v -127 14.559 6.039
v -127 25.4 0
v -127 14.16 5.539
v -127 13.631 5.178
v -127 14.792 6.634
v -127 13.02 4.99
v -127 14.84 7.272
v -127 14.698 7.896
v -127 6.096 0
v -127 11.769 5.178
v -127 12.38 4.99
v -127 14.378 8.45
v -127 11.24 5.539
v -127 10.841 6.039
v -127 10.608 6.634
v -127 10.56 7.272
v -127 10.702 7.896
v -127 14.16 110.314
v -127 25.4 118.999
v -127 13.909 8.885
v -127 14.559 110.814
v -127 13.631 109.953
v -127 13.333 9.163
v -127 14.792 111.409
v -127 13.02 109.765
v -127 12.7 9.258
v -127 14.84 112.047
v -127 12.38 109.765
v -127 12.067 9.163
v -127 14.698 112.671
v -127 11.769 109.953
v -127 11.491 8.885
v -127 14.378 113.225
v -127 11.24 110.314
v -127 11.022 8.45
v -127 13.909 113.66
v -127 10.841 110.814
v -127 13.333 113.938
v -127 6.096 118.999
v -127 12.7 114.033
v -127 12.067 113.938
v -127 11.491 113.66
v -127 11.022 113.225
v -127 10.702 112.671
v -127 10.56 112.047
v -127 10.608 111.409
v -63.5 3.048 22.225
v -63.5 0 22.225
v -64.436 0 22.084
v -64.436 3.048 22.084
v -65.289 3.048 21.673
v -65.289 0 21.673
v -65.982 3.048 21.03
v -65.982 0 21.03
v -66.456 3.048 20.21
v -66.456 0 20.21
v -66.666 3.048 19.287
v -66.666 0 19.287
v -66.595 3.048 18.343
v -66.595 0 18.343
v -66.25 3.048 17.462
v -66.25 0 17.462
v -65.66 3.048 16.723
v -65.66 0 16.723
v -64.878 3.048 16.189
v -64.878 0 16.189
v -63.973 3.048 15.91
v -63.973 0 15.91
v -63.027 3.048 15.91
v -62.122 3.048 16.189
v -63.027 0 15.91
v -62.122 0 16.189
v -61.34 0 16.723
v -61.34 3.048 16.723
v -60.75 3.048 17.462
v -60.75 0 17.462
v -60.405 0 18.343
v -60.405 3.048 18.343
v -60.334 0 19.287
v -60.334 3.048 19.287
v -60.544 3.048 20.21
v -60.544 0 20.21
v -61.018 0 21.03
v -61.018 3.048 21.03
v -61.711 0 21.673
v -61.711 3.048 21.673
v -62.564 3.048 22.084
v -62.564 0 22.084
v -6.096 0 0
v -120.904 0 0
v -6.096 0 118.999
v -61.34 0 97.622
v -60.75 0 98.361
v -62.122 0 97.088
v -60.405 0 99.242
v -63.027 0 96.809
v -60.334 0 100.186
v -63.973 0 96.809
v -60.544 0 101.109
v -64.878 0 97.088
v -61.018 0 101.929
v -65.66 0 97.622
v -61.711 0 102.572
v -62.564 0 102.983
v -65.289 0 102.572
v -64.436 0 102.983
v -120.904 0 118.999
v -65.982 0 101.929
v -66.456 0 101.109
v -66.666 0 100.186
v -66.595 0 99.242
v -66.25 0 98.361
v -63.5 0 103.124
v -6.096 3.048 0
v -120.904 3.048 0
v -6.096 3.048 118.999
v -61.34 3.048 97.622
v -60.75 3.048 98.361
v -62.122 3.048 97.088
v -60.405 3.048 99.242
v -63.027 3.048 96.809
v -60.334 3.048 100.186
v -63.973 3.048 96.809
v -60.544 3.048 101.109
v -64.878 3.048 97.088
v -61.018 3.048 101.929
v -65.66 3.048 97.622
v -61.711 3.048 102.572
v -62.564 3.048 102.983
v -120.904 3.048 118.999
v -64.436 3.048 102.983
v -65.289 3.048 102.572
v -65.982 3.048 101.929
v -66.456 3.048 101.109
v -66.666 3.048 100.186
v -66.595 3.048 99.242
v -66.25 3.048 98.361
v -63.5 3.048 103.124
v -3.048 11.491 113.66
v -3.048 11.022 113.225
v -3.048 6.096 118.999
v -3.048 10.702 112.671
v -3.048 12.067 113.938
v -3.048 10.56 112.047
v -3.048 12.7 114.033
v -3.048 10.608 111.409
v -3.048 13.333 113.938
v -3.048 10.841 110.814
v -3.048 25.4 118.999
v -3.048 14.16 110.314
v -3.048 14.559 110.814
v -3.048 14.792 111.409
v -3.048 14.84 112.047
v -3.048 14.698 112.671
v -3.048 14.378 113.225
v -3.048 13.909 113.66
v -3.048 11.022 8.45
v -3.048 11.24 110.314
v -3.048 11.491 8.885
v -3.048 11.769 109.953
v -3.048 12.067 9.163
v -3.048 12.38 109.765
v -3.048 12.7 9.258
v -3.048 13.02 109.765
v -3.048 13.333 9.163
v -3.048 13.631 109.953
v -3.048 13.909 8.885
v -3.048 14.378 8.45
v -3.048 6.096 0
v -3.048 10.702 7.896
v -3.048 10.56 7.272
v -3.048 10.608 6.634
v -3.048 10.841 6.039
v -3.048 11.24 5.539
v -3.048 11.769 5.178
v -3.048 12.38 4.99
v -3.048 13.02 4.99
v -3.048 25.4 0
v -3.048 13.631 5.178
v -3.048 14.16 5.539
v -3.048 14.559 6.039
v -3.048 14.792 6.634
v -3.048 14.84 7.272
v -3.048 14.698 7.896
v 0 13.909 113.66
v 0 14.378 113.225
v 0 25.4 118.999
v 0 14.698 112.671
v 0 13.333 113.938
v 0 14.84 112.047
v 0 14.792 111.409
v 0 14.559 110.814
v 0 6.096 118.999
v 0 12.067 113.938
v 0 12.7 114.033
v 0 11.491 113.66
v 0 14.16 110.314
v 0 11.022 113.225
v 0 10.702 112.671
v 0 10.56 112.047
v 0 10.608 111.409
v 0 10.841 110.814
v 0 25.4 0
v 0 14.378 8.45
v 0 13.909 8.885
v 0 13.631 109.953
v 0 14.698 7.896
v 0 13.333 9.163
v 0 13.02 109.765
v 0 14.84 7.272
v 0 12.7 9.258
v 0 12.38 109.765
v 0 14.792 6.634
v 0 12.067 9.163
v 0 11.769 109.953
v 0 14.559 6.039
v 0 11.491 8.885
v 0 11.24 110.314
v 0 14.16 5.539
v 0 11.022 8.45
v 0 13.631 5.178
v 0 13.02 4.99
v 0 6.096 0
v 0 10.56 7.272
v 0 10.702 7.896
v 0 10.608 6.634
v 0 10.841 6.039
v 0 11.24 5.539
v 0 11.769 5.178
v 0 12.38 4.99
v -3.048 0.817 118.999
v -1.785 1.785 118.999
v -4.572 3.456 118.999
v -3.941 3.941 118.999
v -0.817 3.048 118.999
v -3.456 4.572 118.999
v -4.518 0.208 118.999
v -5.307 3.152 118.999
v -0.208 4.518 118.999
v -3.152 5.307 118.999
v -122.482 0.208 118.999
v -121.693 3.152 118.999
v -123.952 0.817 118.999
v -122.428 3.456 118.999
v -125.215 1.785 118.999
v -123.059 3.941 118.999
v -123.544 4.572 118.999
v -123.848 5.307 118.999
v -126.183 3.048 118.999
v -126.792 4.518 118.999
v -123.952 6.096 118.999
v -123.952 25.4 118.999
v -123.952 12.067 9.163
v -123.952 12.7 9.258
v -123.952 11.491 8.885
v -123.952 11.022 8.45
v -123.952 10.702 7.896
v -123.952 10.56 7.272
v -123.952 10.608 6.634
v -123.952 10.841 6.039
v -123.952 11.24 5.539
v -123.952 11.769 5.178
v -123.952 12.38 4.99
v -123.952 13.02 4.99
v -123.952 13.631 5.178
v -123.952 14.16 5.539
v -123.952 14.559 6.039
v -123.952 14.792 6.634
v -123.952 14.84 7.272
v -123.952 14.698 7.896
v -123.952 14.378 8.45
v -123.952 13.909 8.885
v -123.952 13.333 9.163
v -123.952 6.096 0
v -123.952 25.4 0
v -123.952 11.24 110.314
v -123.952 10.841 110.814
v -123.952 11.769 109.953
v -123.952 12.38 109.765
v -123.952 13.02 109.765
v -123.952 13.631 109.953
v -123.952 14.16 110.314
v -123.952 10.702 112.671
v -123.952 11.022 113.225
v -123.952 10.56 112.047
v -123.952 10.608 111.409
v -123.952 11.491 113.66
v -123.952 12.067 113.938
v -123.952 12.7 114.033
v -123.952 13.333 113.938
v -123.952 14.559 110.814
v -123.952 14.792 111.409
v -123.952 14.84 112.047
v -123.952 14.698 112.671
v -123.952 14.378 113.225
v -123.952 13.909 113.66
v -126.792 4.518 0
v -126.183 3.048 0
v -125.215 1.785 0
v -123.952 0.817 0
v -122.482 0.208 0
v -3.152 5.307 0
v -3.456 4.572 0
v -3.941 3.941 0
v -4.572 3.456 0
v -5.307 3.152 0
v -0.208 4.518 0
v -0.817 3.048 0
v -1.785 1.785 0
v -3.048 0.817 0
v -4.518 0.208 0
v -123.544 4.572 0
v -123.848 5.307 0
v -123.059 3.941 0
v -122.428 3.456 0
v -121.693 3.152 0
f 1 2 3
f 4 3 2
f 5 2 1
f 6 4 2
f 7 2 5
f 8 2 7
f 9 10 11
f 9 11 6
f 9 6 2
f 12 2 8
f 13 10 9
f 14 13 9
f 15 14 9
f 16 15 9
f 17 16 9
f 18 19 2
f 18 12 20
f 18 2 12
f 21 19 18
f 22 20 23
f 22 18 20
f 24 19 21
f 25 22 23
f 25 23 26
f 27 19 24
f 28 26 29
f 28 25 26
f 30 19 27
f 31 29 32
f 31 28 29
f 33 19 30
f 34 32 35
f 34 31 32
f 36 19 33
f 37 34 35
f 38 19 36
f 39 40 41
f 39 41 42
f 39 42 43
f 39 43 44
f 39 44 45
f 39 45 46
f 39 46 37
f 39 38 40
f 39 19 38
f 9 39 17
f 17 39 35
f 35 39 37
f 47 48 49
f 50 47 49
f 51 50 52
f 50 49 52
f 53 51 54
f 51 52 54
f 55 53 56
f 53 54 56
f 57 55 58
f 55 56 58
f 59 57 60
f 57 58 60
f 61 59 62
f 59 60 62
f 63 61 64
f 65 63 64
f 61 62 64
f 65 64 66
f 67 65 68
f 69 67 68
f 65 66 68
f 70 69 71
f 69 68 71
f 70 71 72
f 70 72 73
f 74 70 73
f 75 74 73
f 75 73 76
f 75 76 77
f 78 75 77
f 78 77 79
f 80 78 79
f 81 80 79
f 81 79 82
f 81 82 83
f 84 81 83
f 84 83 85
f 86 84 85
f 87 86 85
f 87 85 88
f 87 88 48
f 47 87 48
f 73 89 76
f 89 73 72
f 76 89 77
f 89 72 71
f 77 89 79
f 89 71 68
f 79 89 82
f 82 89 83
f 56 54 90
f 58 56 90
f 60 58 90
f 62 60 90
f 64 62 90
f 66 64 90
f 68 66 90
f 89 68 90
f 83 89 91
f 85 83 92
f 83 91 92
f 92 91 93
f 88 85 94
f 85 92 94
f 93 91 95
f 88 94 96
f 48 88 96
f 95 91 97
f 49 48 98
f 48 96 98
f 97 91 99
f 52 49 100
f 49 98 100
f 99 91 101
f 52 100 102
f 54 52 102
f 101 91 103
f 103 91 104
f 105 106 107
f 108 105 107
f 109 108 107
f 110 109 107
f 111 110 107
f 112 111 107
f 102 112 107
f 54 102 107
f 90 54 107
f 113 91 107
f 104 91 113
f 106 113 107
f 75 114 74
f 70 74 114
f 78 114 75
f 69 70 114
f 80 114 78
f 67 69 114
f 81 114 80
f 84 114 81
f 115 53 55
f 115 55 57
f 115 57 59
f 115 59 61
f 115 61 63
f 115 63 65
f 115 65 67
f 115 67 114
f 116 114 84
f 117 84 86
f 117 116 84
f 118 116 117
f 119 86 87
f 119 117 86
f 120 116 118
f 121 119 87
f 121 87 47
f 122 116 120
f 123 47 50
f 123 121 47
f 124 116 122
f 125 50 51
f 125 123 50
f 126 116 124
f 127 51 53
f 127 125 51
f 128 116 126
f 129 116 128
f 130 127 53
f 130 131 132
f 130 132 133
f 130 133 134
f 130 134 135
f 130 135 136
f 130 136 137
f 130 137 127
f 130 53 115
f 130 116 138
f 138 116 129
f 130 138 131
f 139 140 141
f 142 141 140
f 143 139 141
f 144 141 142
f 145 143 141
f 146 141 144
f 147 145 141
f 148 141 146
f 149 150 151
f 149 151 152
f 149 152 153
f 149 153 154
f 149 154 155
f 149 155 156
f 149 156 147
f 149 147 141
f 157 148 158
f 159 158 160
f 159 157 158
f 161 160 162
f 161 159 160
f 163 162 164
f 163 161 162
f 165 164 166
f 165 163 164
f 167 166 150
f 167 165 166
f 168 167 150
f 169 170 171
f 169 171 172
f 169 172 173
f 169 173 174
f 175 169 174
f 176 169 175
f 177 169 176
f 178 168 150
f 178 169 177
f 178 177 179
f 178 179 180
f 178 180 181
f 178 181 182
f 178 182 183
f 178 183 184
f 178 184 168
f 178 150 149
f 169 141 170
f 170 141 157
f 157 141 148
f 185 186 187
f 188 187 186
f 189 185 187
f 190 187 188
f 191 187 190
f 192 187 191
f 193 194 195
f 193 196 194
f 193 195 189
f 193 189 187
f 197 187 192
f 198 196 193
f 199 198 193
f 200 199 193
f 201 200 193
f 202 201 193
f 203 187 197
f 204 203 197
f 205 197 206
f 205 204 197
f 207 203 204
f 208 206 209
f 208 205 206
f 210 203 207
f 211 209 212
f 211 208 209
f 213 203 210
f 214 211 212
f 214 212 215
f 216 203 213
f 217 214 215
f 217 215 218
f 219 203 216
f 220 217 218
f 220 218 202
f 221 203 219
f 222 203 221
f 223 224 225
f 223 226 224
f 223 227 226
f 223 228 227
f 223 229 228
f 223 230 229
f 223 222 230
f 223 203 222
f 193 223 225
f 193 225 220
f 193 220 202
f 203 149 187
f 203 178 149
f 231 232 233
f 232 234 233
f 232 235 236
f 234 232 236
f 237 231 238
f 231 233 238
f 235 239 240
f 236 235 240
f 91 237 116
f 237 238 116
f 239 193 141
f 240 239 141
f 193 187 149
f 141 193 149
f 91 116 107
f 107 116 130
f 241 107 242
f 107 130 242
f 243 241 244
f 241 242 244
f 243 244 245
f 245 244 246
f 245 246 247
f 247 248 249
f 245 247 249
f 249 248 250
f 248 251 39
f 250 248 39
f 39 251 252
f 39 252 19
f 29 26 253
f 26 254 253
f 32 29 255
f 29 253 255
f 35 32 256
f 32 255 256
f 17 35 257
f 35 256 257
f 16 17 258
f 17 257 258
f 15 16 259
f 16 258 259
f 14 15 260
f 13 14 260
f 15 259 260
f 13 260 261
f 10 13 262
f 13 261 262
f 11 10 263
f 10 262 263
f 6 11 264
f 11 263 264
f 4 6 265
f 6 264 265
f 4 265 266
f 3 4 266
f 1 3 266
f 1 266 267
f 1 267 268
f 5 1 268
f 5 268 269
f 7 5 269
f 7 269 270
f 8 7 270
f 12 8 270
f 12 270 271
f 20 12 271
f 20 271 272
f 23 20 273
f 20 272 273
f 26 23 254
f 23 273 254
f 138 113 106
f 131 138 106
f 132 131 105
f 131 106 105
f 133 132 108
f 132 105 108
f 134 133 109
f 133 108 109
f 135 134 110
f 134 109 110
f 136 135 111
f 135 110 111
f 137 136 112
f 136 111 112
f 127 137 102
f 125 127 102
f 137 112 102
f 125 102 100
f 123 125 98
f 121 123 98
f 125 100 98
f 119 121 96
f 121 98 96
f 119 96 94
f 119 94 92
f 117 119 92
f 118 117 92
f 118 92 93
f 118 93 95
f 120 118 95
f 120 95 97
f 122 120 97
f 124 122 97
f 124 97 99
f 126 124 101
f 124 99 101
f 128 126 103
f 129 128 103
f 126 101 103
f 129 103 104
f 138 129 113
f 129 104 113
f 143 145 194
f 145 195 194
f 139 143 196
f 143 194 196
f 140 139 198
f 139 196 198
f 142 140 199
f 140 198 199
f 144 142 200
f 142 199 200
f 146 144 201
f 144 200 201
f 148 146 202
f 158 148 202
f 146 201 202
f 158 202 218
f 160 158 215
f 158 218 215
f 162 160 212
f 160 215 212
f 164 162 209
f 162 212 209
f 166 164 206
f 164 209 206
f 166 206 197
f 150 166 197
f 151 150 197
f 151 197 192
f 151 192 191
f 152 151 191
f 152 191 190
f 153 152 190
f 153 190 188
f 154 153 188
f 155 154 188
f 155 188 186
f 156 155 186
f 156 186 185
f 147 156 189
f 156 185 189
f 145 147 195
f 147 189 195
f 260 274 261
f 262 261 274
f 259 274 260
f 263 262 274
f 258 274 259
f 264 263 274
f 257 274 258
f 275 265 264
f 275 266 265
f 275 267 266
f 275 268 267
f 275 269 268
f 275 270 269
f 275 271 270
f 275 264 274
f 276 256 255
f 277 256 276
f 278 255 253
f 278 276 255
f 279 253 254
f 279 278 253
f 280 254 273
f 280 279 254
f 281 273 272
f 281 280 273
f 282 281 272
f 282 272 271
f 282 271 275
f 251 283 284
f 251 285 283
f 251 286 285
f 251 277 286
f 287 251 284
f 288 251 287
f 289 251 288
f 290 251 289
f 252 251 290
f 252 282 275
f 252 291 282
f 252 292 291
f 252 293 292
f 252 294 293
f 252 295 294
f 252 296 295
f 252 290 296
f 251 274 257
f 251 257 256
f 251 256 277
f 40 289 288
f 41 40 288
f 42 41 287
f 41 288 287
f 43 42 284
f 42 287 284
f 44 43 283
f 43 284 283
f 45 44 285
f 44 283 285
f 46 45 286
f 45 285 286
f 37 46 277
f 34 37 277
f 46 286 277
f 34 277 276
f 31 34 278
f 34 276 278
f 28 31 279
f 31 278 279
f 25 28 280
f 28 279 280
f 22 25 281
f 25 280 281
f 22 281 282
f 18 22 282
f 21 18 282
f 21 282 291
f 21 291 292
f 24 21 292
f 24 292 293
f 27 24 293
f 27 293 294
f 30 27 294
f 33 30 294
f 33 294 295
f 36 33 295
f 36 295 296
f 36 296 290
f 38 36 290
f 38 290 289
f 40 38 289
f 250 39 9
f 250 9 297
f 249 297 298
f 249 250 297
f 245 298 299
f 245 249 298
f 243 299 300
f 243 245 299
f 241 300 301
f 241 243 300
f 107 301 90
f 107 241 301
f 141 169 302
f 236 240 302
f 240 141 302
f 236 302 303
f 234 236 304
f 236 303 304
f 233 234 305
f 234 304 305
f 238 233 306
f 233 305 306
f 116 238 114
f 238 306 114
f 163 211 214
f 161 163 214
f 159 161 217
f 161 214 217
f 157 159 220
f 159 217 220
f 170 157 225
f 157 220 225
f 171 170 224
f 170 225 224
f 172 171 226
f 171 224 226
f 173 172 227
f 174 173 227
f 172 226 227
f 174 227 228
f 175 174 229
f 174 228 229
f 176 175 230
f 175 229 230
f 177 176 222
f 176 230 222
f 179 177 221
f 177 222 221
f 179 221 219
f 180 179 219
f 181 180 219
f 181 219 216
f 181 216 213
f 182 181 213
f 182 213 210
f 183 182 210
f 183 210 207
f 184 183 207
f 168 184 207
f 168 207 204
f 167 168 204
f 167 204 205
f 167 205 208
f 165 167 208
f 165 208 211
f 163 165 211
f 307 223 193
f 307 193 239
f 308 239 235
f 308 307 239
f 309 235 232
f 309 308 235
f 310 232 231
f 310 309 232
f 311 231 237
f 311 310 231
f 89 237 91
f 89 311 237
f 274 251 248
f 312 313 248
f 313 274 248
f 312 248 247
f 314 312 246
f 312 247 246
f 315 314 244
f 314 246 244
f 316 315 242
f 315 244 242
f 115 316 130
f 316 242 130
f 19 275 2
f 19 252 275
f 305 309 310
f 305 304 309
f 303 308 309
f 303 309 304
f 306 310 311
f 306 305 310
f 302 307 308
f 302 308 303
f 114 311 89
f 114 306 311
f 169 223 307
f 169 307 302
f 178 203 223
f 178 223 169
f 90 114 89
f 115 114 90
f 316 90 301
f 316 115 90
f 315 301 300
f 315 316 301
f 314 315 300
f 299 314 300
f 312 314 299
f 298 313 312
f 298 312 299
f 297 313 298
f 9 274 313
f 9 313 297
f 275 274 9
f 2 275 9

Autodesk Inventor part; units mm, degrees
ref_plane "YZ Plane" through (0, 0, 0) normal (1, 0, 0) x (0, 1, 0)
ref_plane "XZ Plane" through (0, 0, 0) normal (0, 1, 0) x (-1, 0, 0)
ref_plane "XY Plane" through (0, 0, 0) normal (0, 0, 1) x (1, 0, 0)
sketch "Sketch1" plane through (0, 0, 0) normal (0, 1, 0) x (-1, 0, 0)
  line L0 (0, 0) -> (127, 0)
  line L1 (127, 0) -> (127, 118.999)
  line L2 (127, 118.999) -> (0, 118.999)
  line L3 (0, 118.999) -> (0, 0)
  dimension "d0" = 127
  dimension "d1" = 118.999
extrude "Plate1" add sketch "Sketch1" along normal blind 3.048
sketch "Sketch2" plane through (-123.952, 0, 118.999) normal (-1, 0, 0) x (0, -1, 0)
  line L0 (0, -118.999) -> (0, 0)
  line L1 (0, 0) -> (-25.4, 0)
  line L2 (-25.4, 0) -> (-25.4, -118.999)
  line L3 (-25.4, -118.999) -> (0, -118.999)
edge flange "Flange1" height 25.4 angle 90 thickness 3.048 bend radius 3.048 thickness toward (-1, 0, 0) relief tear relief width 3.048 relief depth 1.524 edges at (-127, 3.048, 59.4995) wall of the first edge with corners at (-123.952, 0, 0) (-123.952, 0, 118.999) (-123.952, 25.4, 118.999) (-123.952, 25.4, 0)
bend "Bend1"
corner "Corner1"
sketch "Sketch3" plane through (-3.048, 0, 0) normal (1, 0, 0) x (0, 1, 0)
  line L0 (0, 118.999) -> (0, 0)
  line L1 (0, 0) -> (25.4, 0)
  line L2 (25.4, 0) -> (25.4, 118.999)
  line L3 (25.4, 118.999) -> (0, 118.999)
edge flange "Flange2" height 25.4 angle 90 thickness 3.048 bend radius 3.048 thickness toward (1, 0, 0) relief tear relief width 3.048 relief depth 1.524 edges at (0, 3.048, 59.4995) wall of the first edge with corners at (-3.048, 0, 118.999) (-3.048, 0, 0) (-3.048, 25.4, 0) (-3.048, 25.4, 118.999)
bend "Bend2"
corner "Corner2"
sketch "Sketch4" plane through (0, 3.048, 0) normal (0, 1, 0) x (1, 0, 0)
  line L0 (-120.904, 0) -> (-6.096, 0) projected
  line L1 (-6.096, -118.999) -> (-120.904, -118.999) projected
  point P0 (0, 0)
  point P1 (-63.5, -99.949)
  point P2 (-63.5, -19.05)
  dimension "d23" = 19.05
  dimension "d24" = 19.05
hole "Hole1" at (-63.5, 3.048, 99.949) at (-63.5, 3.048, 19.05) direction (0, -1, 0) diameter 6.35 end through all
sketch "Sketch5" plane through (-127, 25.4, 0) normal (-1, 0, 0) x (0, 0, 1)
  line L0 (118.999, 0) -> (118.999, -19.304) projected
  line L1 (0, -19.304) -> (0, 0) projected
  line L2 (118.999, -25.4) -> (0, -25.4) projected
  point P0 (7.112, -12.7)
  point P1 (111.887, -12.7)
  dimension "d32" = 7.112
  dimension "d33" = 7.112
  dimension "d34" = 12.7
  dimension "d35" = 12.7
hole "Hole2" at (-127, 12.7, 7.112) at (-127, 12.7, 111.887) direction (1, 0, 0) diameter 4.2926 depth 1016 tip angle 118
equation "\"d30\" = Thickness"
equation "\"d3\" = BendReliefWidth"
equation "\"d4\" = BendReliefDepth"
equation "\"d5\" = MinimumRemnant"
equation "\"d6\" = BendRadius"
equation "\"d9\" = BendRadius"
equation "\"d10\" = CornerReliefSize"
equation "\"d11\" = GapSize"
equation "\"d12\" = JacobiRadiusSize"
equation "\"d13\" = BendReliefWidth"
equation "\"d14\" = BendReliefDepth"
equation "\"d15\" = MinimumRemnant"
equation "\"d16\" = BendRadius"
equation "\"d19\" = BendRadius"
equation "\"d20\" = CornerReliefSize"
equation "\"d21\" = GapSize"
equation "\"d22\" = JacobiRadiusSize"
equation "\"BendRadius\" = Thickness"
equation "\"BendReliefWidth\" = Thickness"
equation "\"BendReliefDepth\" = 0.5 * Thickness"
equation "\"CornerReliefSize\" = 4 * Thickness"
equation "\"MinimumRemnant\" = 2 * Thickness"
equation "\"TransitionRadius\" = BendRadius"
equation "\"JacobiRadiusSize\" = BendRadius"
equation "\"GapSize\" = Thickness"
equation "\"d2\" = BendRadius"
equation "\"Thickness\" = 3.048"
